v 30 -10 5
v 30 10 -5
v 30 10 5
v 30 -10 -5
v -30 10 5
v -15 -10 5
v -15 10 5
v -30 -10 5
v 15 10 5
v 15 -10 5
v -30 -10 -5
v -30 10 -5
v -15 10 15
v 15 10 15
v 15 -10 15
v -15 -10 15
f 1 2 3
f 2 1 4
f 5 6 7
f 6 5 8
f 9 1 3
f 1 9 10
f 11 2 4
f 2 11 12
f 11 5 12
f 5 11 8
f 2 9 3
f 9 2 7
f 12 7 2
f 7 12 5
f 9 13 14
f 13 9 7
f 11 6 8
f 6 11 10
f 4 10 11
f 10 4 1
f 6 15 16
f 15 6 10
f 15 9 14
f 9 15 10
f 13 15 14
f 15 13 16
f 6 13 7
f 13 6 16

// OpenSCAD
// cube(10);

// cube([25,35,55]);

//cube([23,30,55],center=true);

//% cube([60,20,10],center=true);
//translate([0,0,10-0.001])
//    cube([30,20,10],center=true);

cube([60,20,10],center=true);
translate([0,0,10])
    cube([30,20,10],center=true)
translate([0,0,5])
    cube([30,20,0.002],center=true);
